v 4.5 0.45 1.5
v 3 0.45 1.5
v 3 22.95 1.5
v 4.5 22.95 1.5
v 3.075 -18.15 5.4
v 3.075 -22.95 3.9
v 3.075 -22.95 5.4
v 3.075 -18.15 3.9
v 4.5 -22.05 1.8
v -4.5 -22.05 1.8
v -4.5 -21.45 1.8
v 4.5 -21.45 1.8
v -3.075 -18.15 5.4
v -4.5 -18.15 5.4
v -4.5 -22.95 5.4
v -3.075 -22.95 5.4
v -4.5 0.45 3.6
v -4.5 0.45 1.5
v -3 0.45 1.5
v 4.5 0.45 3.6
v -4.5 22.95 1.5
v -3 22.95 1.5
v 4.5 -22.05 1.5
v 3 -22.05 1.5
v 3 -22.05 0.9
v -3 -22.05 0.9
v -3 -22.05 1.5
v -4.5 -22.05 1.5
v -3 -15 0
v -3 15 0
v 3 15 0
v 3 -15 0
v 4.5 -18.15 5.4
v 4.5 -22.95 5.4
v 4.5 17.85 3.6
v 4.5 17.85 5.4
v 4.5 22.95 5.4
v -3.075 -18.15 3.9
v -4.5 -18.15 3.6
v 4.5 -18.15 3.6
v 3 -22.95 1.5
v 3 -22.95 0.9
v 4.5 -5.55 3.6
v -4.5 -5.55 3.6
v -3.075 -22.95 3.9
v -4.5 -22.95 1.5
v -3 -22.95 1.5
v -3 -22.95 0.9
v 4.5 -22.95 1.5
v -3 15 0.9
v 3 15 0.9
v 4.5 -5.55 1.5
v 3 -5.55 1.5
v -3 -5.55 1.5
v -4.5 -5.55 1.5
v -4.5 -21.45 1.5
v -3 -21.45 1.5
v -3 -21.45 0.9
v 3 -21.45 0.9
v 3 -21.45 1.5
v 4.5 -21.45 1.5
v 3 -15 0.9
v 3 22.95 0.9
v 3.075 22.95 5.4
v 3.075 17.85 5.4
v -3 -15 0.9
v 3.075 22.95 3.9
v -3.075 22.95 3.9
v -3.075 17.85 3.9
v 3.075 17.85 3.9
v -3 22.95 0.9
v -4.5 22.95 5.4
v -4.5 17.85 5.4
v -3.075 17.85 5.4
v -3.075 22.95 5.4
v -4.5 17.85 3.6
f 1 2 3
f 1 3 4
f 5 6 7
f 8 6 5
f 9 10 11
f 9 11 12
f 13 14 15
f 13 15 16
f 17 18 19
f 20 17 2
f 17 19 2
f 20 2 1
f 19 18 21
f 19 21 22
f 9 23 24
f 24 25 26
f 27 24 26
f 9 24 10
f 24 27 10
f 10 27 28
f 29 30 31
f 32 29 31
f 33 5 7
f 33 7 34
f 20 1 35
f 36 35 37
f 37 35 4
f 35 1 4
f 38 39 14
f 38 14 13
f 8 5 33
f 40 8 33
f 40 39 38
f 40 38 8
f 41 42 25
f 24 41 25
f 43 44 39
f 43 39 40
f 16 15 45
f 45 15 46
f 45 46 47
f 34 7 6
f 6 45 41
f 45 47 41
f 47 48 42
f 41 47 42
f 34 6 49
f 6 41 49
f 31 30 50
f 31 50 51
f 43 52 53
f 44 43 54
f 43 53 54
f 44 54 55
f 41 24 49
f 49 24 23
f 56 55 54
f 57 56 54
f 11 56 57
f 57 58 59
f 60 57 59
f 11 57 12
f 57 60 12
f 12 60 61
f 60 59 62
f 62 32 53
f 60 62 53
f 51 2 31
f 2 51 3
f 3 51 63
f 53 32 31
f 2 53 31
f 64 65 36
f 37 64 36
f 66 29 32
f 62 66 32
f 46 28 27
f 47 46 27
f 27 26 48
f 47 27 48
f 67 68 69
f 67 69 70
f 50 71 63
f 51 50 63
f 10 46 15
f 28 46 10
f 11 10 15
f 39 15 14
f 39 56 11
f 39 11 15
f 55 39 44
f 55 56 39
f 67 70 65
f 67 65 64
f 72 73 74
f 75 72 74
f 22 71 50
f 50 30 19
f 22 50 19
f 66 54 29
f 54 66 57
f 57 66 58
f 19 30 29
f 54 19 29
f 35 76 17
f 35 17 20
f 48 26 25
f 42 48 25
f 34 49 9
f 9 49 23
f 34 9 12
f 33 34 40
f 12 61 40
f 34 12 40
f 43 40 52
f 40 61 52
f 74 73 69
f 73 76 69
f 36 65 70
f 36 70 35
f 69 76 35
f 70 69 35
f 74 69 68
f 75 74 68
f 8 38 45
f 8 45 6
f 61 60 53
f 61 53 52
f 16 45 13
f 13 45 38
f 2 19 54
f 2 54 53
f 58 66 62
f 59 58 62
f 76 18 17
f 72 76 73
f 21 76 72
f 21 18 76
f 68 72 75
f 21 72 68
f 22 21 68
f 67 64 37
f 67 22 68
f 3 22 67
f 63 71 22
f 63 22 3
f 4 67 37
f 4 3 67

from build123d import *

# Parameters (mm, degrees)
F0_W      = 2
F0_H      = 10
F1_DEPTH  = 0.3
F2_W      = 2
F2_H      = 2.65
F2_H_2    = 10
F3_DEPTH  = 0.2
F4_W      = 0.5
F4_H      = 7.5
F4_H_2    = 5.8
F4_W_2    = 2
F5_DEPTH  = 0.7
F6_W      = 3
F6_H      = 1.7
F6_H_2    = 1.6
F7_DEPTH  = 0.1
F8_W      = 0.475
F8_H      = 1.7
F8_H_2    = 1.6
F9_DEPTH  = 0.5
F10_W     = 0.5
F10_H     = 0.2
F10_W_2   = 2
F11_DEPTH = 0.3
F12_SCALE = 3


with BuildPart() as f1:
    # F0 (on Top) → F1 (new body)
    with BuildSketch(Plane.XY):
        Rectangle(F0_W, F0_H)
    extrude(amount=F1_DEPTH)

    # F2 (on face) → F3 (join)
    with BuildSketch(Plane.XY.offset(0.3)):
        with Locations((0, 6.325)):
            Rectangle(F2_W, F2_H)
        Rectangle(F2_W, F2_H_2)
        with Locations((0, -6.325)):
            Rectangle(F2_W, F2_H)
    extrude(amount=F3_DEPTH)

    # F4 (on face) → F5 (join)
    with BuildSketch(Plane.XY.offset(0.5)):
        with Locations((-1.25, 3.9)):
            Rectangle(F4_W, F4_H)
        with Locations((1.25, 3.9)):
            Rectangle(F4_W, F4_H)
        with Locations((-1.25, -4.75)):
            Rectangle(F4_W, F4_H_2)
        with Locations((1.25, -4.75)):
            Rectangle(F4_W, F4_H_2)
        with Locations((0, 3.9)):
            Rectangle(F4_W_2, F4_H)
        with Locations((0, -4.75)):
            Rectangle(F4_W_2, F4_H_2)
    extrude(amount=F5_DEPTH)

    # F6 (on face) → F7 (join)
    with BuildSketch(Plane.XY.offset(1.2)):
        with Locations((0, 6.8)):
            Rectangle(F6_W, F6_H)
        with Locations((0, -6.85)):
            Rectangle(F6_W, F6_H_2)
    extrude(amount=F7_DEPTH)

    # F8 (on face) → F9 (join)
    with BuildSketch(Plane.XY.offset(1.3)):
        with Locations((-1.2625, 6.8)):
            Rectangle(F8_W, F8_H)
        with Locations((1.2625, 6.8)):
            Rectangle(F8_W, F8_H)
        with Locations((-1.2625, -6.85)):
            Rectangle(F8_W, F8_H_2)
        with Locations((1.2625, -6.85)):
            Rectangle(F8_W, F8_H_2)
    extrude(amount=F9_DEPTH)

    # F10 (on face) → F11 (cut)
    with BuildSketch(Plane(origin=(0, 0, 0.3), x_dir=(1, 0, 0), z_dir=(0, 0, -1))):
        with Locations((1.25, 7.25)):
            Rectangle(F10_W, F10_H)
        with Locations((-1.25, 7.25)):
            Rectangle(F10_W, F10_H)
        with Locations((0, 7.25)):
            Rectangle(F10_W_2, F10_H)
    extrude(amount=-F11_DEPTH, mode=Mode.SUBTRACT)


with BuildPart() as f1_1:
    # F12: moved
    add(f1.part.scale(F12_SCALE))


solid = f1_1.part
